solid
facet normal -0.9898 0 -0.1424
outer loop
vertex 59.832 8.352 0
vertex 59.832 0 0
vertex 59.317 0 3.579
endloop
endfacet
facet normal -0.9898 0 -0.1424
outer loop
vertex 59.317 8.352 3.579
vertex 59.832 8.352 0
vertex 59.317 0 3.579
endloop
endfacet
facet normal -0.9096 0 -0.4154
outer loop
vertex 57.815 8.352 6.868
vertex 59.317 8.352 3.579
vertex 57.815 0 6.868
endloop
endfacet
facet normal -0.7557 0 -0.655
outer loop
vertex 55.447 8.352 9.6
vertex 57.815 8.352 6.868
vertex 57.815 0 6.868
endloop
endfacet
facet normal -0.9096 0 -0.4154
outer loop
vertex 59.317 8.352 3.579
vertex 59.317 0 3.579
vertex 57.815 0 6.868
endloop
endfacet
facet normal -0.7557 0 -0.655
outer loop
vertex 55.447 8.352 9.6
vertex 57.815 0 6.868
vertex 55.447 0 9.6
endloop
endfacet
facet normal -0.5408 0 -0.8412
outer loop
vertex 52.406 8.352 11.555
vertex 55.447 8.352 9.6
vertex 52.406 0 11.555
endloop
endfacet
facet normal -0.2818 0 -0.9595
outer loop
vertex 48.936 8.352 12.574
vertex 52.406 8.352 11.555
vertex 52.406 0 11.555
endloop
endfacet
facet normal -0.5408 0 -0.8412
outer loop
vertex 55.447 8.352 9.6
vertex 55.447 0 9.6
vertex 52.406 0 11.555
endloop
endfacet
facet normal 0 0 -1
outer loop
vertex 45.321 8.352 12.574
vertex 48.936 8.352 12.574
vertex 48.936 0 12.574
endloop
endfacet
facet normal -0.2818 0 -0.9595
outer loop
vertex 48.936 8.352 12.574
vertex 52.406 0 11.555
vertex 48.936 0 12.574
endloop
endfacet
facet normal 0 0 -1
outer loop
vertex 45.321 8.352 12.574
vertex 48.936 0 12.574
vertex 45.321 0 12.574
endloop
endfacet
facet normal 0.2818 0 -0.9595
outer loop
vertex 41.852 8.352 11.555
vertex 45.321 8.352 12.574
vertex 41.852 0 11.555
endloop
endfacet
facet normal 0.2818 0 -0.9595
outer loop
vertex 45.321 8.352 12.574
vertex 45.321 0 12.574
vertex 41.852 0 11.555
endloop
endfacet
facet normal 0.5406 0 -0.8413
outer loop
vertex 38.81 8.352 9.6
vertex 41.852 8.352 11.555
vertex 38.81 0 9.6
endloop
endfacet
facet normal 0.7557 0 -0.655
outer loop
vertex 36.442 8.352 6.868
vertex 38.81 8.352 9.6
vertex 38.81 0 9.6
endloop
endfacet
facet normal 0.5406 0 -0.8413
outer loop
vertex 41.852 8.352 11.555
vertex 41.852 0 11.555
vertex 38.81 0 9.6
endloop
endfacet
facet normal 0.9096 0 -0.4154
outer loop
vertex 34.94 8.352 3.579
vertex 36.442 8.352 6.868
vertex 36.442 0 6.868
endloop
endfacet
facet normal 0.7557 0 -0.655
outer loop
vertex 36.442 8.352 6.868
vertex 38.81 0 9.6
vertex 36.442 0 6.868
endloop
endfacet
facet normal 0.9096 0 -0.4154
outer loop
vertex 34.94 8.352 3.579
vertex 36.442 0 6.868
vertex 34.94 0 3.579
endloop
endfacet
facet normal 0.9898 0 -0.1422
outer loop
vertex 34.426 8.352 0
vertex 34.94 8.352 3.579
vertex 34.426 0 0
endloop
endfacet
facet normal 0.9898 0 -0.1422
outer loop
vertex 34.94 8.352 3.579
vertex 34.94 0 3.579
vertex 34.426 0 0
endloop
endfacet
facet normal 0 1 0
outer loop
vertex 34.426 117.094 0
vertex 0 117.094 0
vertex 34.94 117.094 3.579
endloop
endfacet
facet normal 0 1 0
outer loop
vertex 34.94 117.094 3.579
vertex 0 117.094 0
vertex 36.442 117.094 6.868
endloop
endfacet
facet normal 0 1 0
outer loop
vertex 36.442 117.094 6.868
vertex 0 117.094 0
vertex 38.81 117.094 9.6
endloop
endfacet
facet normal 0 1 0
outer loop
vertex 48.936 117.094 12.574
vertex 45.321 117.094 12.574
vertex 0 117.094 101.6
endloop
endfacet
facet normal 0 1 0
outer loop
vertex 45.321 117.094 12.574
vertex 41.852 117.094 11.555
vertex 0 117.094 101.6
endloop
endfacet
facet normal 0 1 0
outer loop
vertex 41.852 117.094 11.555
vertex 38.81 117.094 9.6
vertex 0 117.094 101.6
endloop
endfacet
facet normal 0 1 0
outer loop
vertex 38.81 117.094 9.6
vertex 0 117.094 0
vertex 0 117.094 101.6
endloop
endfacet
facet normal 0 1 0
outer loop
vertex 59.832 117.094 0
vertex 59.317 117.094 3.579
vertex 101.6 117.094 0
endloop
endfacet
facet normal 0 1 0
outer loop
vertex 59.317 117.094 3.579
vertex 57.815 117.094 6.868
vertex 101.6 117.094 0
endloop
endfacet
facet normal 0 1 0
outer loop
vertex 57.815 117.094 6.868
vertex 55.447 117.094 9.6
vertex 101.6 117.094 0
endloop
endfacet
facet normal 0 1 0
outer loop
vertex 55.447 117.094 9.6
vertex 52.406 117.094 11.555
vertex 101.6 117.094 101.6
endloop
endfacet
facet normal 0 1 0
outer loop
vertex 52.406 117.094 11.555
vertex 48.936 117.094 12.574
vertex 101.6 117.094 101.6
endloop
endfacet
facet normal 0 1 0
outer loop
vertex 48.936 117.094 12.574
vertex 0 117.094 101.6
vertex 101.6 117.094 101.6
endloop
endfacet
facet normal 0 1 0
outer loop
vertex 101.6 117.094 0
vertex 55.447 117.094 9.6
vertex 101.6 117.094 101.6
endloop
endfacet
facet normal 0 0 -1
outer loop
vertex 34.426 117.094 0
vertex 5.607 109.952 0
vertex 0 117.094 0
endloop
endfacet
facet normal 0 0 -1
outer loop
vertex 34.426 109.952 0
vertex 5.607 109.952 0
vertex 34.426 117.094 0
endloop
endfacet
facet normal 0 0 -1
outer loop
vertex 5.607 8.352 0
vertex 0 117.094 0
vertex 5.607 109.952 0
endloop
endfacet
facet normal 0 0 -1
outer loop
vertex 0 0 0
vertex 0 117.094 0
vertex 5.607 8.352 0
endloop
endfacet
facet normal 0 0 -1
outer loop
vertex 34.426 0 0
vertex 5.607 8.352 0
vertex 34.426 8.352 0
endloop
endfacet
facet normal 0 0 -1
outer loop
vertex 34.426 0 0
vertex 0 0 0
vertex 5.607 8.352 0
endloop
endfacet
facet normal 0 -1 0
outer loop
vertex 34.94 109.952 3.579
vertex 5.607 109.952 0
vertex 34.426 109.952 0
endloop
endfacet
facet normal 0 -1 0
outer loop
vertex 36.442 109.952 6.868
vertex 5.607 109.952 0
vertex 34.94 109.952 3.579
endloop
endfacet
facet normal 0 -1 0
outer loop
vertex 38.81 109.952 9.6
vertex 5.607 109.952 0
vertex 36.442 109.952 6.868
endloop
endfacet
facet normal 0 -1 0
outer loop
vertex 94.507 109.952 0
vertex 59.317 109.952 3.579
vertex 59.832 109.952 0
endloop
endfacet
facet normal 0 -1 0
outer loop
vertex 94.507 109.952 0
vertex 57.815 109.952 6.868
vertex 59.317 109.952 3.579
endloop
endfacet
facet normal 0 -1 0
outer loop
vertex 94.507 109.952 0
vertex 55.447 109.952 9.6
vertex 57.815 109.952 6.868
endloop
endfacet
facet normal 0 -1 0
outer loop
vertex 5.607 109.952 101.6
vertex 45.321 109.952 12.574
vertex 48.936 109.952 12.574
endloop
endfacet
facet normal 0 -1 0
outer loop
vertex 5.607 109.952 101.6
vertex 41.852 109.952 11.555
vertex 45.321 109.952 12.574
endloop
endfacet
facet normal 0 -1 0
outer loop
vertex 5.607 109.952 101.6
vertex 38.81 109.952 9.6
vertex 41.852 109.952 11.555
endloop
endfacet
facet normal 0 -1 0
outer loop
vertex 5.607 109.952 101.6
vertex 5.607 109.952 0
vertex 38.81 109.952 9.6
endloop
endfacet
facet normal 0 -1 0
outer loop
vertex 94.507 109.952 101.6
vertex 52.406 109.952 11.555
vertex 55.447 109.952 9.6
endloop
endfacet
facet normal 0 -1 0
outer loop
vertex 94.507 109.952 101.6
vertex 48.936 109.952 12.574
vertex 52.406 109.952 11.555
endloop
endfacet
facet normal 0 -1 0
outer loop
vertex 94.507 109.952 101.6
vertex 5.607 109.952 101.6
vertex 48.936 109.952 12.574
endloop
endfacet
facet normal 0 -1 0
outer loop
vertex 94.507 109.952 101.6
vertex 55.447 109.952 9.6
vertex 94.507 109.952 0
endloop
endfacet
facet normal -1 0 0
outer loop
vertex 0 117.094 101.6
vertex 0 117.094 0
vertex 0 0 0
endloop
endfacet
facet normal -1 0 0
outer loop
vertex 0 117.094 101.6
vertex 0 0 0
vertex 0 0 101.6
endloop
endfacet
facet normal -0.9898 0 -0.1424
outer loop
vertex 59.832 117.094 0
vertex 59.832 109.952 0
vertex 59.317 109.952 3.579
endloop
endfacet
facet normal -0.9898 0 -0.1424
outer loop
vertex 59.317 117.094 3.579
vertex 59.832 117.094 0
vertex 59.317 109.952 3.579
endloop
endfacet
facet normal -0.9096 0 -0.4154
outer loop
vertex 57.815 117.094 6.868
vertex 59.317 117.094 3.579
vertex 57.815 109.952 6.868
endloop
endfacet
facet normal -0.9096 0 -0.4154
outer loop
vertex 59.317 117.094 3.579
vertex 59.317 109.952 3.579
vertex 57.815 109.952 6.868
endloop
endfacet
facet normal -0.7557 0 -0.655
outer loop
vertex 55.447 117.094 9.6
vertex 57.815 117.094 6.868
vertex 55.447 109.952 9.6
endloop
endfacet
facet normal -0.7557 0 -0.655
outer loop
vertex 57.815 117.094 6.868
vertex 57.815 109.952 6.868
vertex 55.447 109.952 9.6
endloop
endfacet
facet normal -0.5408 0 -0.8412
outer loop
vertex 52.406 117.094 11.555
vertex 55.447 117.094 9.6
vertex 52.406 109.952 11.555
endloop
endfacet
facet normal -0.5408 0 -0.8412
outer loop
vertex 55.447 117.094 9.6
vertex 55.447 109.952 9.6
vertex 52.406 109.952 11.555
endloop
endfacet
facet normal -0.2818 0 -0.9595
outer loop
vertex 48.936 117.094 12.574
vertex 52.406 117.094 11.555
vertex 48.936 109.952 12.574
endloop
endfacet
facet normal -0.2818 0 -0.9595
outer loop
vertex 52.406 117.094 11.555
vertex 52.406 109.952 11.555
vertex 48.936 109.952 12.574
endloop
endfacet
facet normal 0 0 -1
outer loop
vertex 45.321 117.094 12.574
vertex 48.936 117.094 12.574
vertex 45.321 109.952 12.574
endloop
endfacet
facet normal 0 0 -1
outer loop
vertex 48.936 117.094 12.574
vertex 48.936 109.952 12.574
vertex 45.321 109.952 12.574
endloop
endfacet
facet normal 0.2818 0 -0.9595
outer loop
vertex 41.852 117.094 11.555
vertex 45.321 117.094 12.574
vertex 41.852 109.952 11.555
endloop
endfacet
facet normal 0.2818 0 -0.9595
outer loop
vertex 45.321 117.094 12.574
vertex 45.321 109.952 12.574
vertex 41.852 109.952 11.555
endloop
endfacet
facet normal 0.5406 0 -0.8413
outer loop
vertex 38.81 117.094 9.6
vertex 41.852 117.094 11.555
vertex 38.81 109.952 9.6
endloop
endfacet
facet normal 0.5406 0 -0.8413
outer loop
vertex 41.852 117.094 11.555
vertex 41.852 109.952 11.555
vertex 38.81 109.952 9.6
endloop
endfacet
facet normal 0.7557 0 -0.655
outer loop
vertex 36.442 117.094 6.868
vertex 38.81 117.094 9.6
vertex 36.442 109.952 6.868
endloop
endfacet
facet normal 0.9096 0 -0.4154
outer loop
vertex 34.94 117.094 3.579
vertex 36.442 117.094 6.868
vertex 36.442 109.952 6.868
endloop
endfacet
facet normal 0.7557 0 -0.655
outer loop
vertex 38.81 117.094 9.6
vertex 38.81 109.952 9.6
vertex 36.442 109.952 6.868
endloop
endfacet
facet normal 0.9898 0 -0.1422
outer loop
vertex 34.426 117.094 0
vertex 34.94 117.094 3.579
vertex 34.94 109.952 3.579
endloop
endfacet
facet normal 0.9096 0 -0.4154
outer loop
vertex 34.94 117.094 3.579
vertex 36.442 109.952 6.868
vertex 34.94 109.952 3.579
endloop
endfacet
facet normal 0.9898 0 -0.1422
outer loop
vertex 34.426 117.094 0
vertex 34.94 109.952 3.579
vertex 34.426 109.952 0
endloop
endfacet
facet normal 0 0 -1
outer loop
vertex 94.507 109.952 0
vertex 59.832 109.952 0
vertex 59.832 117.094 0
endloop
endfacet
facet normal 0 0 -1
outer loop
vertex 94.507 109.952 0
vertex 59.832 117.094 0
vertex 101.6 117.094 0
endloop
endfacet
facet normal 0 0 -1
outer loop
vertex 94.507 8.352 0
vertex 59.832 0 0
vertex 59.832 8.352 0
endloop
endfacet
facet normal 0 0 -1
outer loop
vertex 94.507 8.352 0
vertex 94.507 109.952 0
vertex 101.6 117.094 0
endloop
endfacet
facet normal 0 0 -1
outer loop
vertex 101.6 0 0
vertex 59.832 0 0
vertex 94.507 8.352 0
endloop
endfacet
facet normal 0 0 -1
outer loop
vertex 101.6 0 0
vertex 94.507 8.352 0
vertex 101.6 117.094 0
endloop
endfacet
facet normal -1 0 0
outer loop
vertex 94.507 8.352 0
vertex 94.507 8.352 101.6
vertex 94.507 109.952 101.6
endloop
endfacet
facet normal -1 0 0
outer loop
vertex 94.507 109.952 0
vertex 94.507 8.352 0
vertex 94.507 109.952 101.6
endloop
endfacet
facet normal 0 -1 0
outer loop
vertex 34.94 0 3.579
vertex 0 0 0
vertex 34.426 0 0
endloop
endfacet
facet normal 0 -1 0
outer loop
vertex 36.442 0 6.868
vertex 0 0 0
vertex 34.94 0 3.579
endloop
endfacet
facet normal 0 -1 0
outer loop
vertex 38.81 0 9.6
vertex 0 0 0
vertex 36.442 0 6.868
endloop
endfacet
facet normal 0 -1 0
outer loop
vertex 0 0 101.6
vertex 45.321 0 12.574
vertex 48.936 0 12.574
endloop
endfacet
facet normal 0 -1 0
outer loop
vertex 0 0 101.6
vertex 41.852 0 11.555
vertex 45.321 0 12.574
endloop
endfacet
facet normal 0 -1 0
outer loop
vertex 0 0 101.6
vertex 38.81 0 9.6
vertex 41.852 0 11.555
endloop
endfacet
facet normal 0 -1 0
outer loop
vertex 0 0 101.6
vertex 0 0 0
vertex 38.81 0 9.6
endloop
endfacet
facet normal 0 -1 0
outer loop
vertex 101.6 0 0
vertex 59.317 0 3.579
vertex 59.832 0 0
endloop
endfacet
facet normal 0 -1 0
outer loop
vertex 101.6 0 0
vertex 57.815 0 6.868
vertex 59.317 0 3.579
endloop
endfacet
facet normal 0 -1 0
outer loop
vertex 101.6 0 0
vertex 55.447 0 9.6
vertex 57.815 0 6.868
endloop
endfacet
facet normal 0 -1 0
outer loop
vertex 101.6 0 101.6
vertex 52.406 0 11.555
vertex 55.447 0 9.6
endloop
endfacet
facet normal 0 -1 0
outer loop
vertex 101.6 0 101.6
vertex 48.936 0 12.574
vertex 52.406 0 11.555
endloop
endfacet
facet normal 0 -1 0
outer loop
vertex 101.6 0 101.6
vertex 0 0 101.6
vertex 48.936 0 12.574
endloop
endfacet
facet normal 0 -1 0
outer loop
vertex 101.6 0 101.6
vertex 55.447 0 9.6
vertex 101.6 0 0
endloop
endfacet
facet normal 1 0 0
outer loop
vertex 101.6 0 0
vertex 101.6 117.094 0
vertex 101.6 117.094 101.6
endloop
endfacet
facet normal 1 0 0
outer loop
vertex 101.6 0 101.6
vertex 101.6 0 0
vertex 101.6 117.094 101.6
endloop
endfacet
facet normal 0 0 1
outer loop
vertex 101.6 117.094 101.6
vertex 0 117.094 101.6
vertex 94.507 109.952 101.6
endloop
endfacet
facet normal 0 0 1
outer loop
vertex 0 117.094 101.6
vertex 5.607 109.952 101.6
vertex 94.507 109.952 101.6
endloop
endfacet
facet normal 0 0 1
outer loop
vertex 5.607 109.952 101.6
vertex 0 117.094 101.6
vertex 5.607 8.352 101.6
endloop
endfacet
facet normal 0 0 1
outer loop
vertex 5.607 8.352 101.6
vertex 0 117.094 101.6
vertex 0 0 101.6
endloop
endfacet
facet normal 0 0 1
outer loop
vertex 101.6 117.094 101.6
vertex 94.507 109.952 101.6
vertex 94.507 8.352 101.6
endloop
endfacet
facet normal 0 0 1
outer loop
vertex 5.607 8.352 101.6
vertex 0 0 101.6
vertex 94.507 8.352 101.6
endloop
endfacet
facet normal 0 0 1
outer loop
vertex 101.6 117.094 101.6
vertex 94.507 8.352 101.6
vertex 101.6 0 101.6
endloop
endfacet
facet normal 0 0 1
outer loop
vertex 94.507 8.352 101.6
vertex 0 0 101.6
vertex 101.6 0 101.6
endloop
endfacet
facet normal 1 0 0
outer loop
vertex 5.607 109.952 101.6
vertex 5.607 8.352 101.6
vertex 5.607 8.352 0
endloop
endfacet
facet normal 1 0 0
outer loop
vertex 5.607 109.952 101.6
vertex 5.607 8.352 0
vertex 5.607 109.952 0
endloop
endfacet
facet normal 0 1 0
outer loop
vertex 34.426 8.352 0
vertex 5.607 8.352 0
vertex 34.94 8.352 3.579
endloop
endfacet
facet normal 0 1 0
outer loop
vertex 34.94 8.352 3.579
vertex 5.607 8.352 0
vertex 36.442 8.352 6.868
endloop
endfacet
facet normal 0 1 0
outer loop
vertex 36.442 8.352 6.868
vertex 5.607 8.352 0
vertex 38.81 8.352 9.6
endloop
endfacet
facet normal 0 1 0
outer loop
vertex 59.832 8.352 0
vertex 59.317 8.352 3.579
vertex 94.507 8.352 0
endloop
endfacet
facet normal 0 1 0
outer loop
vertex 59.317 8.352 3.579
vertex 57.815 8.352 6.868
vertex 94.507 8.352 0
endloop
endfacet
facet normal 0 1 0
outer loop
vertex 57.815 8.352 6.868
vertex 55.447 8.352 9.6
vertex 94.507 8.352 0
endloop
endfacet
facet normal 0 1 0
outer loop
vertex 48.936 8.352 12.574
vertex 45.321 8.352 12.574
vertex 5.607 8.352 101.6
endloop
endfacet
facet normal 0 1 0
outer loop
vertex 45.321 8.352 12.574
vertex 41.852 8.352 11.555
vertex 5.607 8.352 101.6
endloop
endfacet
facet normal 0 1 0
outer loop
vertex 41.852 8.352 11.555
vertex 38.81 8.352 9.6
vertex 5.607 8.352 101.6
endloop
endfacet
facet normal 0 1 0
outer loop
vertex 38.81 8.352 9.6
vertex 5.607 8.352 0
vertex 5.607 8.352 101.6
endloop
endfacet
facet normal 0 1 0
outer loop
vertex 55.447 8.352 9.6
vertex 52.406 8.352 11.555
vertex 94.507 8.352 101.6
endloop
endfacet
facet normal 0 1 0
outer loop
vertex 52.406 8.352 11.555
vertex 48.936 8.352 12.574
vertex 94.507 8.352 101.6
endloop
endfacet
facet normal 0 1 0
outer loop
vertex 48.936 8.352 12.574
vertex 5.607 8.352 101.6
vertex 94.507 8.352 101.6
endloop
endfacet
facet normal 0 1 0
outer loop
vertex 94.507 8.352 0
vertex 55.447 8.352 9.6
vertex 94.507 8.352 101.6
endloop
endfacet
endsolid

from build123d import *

# Parameters (mm, degrees)
F0_W     = 101.6
F0_H     = 101.6
F2_DEPTH = 117.094
F3_DEPTH = 117.094
F4_W     = 88.9
F4_H     = 101.6
F5_DEPTH = 104.394


with BuildPart() as f2:
    # F0 (on Front) → F2 (new body)
    with BuildSketch(Plane.XZ):
        with Locations((50.8, 50.8)):
            Rectangle(F0_W, F0_H)
    extrude(amount=-F2_DEPTH)

    # F1 (on face) → F3 (cut)
    with BuildSketch(Plane.XZ):
        with BuildLine():
            Line((34.425654, 0), (59.831641, 0))
            ThreePointArc((59.831641, 0), (47.128648, 12.702994), (34.425654, 0))
        make_face()
    extrude(amount=-F3_DEPTH, mode=Mode.SUBTRACT)

    # F4 (on face) → F5 (cut)
    with BuildSketch(Plane.XY.offset(101.6)):
        with Locations((50.05706, 59.151817)):
            Rectangle(F4_W, F4_H)
    extrude(amount=-F5_DEPTH, mode=Mode.SUBTRACT)


solid = f2.part
